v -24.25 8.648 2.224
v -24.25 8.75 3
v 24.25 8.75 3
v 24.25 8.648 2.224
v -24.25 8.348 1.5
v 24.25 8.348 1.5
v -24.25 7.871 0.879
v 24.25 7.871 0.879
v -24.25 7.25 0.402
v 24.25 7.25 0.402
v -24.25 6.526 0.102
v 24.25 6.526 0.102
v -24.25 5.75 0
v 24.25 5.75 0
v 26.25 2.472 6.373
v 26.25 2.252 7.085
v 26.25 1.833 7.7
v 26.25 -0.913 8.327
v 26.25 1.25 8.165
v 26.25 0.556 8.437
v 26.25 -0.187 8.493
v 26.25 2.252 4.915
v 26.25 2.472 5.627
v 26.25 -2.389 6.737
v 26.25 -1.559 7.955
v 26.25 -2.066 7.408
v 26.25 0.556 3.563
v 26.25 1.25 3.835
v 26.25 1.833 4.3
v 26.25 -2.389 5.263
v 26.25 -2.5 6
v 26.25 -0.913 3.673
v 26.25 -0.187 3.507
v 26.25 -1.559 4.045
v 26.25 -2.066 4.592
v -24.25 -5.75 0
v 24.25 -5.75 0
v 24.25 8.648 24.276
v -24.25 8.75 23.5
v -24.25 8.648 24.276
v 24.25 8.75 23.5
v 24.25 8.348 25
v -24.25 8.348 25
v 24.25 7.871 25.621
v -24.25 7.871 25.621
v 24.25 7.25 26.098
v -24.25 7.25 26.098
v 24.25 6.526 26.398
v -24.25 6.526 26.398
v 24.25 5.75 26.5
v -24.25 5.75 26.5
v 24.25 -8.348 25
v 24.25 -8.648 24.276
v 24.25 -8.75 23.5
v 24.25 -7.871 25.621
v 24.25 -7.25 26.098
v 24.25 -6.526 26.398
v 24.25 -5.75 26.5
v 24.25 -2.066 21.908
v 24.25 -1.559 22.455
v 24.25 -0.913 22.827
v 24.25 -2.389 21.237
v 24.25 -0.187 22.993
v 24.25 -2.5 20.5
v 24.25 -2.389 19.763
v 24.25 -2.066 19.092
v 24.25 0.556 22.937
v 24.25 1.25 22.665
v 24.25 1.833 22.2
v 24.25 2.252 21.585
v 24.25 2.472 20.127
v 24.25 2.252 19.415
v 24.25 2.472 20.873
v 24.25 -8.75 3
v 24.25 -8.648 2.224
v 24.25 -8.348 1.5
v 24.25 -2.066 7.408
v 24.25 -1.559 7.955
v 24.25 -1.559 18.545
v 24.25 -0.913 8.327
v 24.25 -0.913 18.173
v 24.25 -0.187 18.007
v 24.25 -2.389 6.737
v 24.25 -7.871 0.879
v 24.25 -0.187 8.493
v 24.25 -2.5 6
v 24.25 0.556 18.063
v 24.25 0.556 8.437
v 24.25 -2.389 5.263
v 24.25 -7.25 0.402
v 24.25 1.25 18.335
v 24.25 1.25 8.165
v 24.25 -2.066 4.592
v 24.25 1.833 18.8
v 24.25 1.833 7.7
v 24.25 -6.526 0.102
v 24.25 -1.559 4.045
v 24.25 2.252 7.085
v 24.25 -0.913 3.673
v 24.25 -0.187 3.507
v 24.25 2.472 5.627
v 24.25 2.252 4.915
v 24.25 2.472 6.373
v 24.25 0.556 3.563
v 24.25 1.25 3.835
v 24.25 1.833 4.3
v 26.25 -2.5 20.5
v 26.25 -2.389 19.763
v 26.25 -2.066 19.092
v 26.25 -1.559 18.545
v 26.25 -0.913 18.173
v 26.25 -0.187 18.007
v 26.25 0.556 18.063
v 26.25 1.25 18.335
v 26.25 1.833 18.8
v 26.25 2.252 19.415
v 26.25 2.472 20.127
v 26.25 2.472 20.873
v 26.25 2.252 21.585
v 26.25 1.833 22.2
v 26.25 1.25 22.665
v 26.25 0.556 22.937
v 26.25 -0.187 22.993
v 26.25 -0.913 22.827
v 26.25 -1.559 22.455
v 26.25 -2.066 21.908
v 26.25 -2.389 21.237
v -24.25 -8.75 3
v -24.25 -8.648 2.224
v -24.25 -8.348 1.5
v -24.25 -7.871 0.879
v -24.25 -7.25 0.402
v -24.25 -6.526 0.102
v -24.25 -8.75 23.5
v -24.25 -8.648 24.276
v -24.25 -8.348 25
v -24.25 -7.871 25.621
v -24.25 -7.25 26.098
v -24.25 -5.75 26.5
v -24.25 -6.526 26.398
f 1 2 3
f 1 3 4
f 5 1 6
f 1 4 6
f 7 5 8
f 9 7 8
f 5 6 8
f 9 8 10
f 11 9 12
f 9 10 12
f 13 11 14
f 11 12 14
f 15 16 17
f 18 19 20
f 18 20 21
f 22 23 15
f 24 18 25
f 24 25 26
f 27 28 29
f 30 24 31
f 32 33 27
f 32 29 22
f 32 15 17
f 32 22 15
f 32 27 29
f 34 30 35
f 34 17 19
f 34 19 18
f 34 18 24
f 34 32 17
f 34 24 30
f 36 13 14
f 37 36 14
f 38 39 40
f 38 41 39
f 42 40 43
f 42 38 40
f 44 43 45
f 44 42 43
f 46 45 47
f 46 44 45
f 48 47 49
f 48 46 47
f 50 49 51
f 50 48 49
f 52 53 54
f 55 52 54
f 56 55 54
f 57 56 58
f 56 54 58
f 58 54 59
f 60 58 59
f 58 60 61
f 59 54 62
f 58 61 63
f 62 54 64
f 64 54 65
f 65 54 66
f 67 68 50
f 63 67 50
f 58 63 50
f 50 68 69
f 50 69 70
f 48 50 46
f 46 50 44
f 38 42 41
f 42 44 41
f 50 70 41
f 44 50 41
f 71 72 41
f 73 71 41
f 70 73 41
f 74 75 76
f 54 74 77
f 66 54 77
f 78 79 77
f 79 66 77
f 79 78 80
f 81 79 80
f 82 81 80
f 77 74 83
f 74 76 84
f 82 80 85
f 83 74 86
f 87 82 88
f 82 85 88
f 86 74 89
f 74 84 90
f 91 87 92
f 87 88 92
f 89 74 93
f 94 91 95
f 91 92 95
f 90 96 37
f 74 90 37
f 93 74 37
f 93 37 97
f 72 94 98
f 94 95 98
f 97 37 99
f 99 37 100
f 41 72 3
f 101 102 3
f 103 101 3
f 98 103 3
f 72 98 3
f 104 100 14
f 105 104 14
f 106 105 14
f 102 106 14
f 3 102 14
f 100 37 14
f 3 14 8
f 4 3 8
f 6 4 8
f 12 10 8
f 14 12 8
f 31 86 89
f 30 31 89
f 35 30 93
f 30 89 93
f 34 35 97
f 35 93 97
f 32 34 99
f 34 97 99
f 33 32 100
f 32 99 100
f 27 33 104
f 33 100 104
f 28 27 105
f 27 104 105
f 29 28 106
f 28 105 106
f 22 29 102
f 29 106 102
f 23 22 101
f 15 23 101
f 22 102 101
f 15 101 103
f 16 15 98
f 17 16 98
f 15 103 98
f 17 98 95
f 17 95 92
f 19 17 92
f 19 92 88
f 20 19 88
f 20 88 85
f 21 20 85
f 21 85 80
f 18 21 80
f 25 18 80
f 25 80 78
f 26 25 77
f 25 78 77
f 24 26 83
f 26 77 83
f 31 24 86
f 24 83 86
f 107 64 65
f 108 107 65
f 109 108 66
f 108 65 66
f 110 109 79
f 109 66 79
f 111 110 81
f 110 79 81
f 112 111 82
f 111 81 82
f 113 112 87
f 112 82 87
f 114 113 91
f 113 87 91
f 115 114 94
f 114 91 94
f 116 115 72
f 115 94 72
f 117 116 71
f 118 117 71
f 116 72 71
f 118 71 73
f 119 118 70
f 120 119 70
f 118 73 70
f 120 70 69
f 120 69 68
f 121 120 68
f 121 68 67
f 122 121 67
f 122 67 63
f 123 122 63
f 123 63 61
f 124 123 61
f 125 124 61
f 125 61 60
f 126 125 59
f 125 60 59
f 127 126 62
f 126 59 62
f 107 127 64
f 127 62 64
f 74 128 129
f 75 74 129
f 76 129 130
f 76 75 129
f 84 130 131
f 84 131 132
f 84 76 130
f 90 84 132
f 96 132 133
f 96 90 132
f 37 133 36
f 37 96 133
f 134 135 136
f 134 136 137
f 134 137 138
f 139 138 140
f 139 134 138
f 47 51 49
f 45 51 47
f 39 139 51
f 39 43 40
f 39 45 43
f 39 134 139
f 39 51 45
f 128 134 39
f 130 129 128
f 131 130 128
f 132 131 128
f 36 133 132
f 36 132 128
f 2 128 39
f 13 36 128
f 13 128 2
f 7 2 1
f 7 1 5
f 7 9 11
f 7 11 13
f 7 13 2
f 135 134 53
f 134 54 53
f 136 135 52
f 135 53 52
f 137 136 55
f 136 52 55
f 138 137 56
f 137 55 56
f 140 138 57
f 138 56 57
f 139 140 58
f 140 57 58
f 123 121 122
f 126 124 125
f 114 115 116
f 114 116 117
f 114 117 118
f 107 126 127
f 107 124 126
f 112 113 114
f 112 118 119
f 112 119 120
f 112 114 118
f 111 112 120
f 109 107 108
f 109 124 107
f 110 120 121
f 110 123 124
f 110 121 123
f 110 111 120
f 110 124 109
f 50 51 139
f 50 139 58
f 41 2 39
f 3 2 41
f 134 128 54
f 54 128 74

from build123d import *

# Parameters (mm, degrees)
SKETCH_1_W      = 48.5
SKETCH_1_H      = 17.5
EXTRUDE_1_DEPTH = 26.5
FILLET_1_R      = 3
SKETCH_2_R      = 2.5
EXTRUDE_2_DEPTH = 2


with BuildPart() as part:
    # ｽｹｯﾁ1 → ﾎﾞｽ - 押し出し1 (new body)
    with BuildSketch(Plane.XY):
        Rectangle(SKETCH_1_W, SKETCH_1_H)
    extrude(amount=EXTRUDE_1_DEPTH)

    # ﾌｨﾚｯﾄ1
    fillet_1_edges = [part.edges().sort_by_distance(p)[0] for p in [
        (0, -8.75, 26.5),
        (0, -8.75, 0),
        (0, 8.75, 0),
        (0, 8.75, 26.5),
    ]]
    fillet(fillet_1_edges, radius=FILLET_1_R)

    # ｽｹｯﾁ2 → ﾎﾞｽ - 押し出し2 (add)
    with BuildSketch(Plane(origin=(24.25, 0, 0), x_dir=(0, 0, -1), z_dir=(1, 0, 0))):
        with Locations(Location((-20.5, 0, 0), (0, 0, 270))):
            Circle(SKETCH_2_R)
        with Locations(Location((-6, 0, 0), (0, 0, 270))):
            Circle(SKETCH_2_R)
    extrude(amount=EXTRUDE_2_DEPTH)


solid = part.part
